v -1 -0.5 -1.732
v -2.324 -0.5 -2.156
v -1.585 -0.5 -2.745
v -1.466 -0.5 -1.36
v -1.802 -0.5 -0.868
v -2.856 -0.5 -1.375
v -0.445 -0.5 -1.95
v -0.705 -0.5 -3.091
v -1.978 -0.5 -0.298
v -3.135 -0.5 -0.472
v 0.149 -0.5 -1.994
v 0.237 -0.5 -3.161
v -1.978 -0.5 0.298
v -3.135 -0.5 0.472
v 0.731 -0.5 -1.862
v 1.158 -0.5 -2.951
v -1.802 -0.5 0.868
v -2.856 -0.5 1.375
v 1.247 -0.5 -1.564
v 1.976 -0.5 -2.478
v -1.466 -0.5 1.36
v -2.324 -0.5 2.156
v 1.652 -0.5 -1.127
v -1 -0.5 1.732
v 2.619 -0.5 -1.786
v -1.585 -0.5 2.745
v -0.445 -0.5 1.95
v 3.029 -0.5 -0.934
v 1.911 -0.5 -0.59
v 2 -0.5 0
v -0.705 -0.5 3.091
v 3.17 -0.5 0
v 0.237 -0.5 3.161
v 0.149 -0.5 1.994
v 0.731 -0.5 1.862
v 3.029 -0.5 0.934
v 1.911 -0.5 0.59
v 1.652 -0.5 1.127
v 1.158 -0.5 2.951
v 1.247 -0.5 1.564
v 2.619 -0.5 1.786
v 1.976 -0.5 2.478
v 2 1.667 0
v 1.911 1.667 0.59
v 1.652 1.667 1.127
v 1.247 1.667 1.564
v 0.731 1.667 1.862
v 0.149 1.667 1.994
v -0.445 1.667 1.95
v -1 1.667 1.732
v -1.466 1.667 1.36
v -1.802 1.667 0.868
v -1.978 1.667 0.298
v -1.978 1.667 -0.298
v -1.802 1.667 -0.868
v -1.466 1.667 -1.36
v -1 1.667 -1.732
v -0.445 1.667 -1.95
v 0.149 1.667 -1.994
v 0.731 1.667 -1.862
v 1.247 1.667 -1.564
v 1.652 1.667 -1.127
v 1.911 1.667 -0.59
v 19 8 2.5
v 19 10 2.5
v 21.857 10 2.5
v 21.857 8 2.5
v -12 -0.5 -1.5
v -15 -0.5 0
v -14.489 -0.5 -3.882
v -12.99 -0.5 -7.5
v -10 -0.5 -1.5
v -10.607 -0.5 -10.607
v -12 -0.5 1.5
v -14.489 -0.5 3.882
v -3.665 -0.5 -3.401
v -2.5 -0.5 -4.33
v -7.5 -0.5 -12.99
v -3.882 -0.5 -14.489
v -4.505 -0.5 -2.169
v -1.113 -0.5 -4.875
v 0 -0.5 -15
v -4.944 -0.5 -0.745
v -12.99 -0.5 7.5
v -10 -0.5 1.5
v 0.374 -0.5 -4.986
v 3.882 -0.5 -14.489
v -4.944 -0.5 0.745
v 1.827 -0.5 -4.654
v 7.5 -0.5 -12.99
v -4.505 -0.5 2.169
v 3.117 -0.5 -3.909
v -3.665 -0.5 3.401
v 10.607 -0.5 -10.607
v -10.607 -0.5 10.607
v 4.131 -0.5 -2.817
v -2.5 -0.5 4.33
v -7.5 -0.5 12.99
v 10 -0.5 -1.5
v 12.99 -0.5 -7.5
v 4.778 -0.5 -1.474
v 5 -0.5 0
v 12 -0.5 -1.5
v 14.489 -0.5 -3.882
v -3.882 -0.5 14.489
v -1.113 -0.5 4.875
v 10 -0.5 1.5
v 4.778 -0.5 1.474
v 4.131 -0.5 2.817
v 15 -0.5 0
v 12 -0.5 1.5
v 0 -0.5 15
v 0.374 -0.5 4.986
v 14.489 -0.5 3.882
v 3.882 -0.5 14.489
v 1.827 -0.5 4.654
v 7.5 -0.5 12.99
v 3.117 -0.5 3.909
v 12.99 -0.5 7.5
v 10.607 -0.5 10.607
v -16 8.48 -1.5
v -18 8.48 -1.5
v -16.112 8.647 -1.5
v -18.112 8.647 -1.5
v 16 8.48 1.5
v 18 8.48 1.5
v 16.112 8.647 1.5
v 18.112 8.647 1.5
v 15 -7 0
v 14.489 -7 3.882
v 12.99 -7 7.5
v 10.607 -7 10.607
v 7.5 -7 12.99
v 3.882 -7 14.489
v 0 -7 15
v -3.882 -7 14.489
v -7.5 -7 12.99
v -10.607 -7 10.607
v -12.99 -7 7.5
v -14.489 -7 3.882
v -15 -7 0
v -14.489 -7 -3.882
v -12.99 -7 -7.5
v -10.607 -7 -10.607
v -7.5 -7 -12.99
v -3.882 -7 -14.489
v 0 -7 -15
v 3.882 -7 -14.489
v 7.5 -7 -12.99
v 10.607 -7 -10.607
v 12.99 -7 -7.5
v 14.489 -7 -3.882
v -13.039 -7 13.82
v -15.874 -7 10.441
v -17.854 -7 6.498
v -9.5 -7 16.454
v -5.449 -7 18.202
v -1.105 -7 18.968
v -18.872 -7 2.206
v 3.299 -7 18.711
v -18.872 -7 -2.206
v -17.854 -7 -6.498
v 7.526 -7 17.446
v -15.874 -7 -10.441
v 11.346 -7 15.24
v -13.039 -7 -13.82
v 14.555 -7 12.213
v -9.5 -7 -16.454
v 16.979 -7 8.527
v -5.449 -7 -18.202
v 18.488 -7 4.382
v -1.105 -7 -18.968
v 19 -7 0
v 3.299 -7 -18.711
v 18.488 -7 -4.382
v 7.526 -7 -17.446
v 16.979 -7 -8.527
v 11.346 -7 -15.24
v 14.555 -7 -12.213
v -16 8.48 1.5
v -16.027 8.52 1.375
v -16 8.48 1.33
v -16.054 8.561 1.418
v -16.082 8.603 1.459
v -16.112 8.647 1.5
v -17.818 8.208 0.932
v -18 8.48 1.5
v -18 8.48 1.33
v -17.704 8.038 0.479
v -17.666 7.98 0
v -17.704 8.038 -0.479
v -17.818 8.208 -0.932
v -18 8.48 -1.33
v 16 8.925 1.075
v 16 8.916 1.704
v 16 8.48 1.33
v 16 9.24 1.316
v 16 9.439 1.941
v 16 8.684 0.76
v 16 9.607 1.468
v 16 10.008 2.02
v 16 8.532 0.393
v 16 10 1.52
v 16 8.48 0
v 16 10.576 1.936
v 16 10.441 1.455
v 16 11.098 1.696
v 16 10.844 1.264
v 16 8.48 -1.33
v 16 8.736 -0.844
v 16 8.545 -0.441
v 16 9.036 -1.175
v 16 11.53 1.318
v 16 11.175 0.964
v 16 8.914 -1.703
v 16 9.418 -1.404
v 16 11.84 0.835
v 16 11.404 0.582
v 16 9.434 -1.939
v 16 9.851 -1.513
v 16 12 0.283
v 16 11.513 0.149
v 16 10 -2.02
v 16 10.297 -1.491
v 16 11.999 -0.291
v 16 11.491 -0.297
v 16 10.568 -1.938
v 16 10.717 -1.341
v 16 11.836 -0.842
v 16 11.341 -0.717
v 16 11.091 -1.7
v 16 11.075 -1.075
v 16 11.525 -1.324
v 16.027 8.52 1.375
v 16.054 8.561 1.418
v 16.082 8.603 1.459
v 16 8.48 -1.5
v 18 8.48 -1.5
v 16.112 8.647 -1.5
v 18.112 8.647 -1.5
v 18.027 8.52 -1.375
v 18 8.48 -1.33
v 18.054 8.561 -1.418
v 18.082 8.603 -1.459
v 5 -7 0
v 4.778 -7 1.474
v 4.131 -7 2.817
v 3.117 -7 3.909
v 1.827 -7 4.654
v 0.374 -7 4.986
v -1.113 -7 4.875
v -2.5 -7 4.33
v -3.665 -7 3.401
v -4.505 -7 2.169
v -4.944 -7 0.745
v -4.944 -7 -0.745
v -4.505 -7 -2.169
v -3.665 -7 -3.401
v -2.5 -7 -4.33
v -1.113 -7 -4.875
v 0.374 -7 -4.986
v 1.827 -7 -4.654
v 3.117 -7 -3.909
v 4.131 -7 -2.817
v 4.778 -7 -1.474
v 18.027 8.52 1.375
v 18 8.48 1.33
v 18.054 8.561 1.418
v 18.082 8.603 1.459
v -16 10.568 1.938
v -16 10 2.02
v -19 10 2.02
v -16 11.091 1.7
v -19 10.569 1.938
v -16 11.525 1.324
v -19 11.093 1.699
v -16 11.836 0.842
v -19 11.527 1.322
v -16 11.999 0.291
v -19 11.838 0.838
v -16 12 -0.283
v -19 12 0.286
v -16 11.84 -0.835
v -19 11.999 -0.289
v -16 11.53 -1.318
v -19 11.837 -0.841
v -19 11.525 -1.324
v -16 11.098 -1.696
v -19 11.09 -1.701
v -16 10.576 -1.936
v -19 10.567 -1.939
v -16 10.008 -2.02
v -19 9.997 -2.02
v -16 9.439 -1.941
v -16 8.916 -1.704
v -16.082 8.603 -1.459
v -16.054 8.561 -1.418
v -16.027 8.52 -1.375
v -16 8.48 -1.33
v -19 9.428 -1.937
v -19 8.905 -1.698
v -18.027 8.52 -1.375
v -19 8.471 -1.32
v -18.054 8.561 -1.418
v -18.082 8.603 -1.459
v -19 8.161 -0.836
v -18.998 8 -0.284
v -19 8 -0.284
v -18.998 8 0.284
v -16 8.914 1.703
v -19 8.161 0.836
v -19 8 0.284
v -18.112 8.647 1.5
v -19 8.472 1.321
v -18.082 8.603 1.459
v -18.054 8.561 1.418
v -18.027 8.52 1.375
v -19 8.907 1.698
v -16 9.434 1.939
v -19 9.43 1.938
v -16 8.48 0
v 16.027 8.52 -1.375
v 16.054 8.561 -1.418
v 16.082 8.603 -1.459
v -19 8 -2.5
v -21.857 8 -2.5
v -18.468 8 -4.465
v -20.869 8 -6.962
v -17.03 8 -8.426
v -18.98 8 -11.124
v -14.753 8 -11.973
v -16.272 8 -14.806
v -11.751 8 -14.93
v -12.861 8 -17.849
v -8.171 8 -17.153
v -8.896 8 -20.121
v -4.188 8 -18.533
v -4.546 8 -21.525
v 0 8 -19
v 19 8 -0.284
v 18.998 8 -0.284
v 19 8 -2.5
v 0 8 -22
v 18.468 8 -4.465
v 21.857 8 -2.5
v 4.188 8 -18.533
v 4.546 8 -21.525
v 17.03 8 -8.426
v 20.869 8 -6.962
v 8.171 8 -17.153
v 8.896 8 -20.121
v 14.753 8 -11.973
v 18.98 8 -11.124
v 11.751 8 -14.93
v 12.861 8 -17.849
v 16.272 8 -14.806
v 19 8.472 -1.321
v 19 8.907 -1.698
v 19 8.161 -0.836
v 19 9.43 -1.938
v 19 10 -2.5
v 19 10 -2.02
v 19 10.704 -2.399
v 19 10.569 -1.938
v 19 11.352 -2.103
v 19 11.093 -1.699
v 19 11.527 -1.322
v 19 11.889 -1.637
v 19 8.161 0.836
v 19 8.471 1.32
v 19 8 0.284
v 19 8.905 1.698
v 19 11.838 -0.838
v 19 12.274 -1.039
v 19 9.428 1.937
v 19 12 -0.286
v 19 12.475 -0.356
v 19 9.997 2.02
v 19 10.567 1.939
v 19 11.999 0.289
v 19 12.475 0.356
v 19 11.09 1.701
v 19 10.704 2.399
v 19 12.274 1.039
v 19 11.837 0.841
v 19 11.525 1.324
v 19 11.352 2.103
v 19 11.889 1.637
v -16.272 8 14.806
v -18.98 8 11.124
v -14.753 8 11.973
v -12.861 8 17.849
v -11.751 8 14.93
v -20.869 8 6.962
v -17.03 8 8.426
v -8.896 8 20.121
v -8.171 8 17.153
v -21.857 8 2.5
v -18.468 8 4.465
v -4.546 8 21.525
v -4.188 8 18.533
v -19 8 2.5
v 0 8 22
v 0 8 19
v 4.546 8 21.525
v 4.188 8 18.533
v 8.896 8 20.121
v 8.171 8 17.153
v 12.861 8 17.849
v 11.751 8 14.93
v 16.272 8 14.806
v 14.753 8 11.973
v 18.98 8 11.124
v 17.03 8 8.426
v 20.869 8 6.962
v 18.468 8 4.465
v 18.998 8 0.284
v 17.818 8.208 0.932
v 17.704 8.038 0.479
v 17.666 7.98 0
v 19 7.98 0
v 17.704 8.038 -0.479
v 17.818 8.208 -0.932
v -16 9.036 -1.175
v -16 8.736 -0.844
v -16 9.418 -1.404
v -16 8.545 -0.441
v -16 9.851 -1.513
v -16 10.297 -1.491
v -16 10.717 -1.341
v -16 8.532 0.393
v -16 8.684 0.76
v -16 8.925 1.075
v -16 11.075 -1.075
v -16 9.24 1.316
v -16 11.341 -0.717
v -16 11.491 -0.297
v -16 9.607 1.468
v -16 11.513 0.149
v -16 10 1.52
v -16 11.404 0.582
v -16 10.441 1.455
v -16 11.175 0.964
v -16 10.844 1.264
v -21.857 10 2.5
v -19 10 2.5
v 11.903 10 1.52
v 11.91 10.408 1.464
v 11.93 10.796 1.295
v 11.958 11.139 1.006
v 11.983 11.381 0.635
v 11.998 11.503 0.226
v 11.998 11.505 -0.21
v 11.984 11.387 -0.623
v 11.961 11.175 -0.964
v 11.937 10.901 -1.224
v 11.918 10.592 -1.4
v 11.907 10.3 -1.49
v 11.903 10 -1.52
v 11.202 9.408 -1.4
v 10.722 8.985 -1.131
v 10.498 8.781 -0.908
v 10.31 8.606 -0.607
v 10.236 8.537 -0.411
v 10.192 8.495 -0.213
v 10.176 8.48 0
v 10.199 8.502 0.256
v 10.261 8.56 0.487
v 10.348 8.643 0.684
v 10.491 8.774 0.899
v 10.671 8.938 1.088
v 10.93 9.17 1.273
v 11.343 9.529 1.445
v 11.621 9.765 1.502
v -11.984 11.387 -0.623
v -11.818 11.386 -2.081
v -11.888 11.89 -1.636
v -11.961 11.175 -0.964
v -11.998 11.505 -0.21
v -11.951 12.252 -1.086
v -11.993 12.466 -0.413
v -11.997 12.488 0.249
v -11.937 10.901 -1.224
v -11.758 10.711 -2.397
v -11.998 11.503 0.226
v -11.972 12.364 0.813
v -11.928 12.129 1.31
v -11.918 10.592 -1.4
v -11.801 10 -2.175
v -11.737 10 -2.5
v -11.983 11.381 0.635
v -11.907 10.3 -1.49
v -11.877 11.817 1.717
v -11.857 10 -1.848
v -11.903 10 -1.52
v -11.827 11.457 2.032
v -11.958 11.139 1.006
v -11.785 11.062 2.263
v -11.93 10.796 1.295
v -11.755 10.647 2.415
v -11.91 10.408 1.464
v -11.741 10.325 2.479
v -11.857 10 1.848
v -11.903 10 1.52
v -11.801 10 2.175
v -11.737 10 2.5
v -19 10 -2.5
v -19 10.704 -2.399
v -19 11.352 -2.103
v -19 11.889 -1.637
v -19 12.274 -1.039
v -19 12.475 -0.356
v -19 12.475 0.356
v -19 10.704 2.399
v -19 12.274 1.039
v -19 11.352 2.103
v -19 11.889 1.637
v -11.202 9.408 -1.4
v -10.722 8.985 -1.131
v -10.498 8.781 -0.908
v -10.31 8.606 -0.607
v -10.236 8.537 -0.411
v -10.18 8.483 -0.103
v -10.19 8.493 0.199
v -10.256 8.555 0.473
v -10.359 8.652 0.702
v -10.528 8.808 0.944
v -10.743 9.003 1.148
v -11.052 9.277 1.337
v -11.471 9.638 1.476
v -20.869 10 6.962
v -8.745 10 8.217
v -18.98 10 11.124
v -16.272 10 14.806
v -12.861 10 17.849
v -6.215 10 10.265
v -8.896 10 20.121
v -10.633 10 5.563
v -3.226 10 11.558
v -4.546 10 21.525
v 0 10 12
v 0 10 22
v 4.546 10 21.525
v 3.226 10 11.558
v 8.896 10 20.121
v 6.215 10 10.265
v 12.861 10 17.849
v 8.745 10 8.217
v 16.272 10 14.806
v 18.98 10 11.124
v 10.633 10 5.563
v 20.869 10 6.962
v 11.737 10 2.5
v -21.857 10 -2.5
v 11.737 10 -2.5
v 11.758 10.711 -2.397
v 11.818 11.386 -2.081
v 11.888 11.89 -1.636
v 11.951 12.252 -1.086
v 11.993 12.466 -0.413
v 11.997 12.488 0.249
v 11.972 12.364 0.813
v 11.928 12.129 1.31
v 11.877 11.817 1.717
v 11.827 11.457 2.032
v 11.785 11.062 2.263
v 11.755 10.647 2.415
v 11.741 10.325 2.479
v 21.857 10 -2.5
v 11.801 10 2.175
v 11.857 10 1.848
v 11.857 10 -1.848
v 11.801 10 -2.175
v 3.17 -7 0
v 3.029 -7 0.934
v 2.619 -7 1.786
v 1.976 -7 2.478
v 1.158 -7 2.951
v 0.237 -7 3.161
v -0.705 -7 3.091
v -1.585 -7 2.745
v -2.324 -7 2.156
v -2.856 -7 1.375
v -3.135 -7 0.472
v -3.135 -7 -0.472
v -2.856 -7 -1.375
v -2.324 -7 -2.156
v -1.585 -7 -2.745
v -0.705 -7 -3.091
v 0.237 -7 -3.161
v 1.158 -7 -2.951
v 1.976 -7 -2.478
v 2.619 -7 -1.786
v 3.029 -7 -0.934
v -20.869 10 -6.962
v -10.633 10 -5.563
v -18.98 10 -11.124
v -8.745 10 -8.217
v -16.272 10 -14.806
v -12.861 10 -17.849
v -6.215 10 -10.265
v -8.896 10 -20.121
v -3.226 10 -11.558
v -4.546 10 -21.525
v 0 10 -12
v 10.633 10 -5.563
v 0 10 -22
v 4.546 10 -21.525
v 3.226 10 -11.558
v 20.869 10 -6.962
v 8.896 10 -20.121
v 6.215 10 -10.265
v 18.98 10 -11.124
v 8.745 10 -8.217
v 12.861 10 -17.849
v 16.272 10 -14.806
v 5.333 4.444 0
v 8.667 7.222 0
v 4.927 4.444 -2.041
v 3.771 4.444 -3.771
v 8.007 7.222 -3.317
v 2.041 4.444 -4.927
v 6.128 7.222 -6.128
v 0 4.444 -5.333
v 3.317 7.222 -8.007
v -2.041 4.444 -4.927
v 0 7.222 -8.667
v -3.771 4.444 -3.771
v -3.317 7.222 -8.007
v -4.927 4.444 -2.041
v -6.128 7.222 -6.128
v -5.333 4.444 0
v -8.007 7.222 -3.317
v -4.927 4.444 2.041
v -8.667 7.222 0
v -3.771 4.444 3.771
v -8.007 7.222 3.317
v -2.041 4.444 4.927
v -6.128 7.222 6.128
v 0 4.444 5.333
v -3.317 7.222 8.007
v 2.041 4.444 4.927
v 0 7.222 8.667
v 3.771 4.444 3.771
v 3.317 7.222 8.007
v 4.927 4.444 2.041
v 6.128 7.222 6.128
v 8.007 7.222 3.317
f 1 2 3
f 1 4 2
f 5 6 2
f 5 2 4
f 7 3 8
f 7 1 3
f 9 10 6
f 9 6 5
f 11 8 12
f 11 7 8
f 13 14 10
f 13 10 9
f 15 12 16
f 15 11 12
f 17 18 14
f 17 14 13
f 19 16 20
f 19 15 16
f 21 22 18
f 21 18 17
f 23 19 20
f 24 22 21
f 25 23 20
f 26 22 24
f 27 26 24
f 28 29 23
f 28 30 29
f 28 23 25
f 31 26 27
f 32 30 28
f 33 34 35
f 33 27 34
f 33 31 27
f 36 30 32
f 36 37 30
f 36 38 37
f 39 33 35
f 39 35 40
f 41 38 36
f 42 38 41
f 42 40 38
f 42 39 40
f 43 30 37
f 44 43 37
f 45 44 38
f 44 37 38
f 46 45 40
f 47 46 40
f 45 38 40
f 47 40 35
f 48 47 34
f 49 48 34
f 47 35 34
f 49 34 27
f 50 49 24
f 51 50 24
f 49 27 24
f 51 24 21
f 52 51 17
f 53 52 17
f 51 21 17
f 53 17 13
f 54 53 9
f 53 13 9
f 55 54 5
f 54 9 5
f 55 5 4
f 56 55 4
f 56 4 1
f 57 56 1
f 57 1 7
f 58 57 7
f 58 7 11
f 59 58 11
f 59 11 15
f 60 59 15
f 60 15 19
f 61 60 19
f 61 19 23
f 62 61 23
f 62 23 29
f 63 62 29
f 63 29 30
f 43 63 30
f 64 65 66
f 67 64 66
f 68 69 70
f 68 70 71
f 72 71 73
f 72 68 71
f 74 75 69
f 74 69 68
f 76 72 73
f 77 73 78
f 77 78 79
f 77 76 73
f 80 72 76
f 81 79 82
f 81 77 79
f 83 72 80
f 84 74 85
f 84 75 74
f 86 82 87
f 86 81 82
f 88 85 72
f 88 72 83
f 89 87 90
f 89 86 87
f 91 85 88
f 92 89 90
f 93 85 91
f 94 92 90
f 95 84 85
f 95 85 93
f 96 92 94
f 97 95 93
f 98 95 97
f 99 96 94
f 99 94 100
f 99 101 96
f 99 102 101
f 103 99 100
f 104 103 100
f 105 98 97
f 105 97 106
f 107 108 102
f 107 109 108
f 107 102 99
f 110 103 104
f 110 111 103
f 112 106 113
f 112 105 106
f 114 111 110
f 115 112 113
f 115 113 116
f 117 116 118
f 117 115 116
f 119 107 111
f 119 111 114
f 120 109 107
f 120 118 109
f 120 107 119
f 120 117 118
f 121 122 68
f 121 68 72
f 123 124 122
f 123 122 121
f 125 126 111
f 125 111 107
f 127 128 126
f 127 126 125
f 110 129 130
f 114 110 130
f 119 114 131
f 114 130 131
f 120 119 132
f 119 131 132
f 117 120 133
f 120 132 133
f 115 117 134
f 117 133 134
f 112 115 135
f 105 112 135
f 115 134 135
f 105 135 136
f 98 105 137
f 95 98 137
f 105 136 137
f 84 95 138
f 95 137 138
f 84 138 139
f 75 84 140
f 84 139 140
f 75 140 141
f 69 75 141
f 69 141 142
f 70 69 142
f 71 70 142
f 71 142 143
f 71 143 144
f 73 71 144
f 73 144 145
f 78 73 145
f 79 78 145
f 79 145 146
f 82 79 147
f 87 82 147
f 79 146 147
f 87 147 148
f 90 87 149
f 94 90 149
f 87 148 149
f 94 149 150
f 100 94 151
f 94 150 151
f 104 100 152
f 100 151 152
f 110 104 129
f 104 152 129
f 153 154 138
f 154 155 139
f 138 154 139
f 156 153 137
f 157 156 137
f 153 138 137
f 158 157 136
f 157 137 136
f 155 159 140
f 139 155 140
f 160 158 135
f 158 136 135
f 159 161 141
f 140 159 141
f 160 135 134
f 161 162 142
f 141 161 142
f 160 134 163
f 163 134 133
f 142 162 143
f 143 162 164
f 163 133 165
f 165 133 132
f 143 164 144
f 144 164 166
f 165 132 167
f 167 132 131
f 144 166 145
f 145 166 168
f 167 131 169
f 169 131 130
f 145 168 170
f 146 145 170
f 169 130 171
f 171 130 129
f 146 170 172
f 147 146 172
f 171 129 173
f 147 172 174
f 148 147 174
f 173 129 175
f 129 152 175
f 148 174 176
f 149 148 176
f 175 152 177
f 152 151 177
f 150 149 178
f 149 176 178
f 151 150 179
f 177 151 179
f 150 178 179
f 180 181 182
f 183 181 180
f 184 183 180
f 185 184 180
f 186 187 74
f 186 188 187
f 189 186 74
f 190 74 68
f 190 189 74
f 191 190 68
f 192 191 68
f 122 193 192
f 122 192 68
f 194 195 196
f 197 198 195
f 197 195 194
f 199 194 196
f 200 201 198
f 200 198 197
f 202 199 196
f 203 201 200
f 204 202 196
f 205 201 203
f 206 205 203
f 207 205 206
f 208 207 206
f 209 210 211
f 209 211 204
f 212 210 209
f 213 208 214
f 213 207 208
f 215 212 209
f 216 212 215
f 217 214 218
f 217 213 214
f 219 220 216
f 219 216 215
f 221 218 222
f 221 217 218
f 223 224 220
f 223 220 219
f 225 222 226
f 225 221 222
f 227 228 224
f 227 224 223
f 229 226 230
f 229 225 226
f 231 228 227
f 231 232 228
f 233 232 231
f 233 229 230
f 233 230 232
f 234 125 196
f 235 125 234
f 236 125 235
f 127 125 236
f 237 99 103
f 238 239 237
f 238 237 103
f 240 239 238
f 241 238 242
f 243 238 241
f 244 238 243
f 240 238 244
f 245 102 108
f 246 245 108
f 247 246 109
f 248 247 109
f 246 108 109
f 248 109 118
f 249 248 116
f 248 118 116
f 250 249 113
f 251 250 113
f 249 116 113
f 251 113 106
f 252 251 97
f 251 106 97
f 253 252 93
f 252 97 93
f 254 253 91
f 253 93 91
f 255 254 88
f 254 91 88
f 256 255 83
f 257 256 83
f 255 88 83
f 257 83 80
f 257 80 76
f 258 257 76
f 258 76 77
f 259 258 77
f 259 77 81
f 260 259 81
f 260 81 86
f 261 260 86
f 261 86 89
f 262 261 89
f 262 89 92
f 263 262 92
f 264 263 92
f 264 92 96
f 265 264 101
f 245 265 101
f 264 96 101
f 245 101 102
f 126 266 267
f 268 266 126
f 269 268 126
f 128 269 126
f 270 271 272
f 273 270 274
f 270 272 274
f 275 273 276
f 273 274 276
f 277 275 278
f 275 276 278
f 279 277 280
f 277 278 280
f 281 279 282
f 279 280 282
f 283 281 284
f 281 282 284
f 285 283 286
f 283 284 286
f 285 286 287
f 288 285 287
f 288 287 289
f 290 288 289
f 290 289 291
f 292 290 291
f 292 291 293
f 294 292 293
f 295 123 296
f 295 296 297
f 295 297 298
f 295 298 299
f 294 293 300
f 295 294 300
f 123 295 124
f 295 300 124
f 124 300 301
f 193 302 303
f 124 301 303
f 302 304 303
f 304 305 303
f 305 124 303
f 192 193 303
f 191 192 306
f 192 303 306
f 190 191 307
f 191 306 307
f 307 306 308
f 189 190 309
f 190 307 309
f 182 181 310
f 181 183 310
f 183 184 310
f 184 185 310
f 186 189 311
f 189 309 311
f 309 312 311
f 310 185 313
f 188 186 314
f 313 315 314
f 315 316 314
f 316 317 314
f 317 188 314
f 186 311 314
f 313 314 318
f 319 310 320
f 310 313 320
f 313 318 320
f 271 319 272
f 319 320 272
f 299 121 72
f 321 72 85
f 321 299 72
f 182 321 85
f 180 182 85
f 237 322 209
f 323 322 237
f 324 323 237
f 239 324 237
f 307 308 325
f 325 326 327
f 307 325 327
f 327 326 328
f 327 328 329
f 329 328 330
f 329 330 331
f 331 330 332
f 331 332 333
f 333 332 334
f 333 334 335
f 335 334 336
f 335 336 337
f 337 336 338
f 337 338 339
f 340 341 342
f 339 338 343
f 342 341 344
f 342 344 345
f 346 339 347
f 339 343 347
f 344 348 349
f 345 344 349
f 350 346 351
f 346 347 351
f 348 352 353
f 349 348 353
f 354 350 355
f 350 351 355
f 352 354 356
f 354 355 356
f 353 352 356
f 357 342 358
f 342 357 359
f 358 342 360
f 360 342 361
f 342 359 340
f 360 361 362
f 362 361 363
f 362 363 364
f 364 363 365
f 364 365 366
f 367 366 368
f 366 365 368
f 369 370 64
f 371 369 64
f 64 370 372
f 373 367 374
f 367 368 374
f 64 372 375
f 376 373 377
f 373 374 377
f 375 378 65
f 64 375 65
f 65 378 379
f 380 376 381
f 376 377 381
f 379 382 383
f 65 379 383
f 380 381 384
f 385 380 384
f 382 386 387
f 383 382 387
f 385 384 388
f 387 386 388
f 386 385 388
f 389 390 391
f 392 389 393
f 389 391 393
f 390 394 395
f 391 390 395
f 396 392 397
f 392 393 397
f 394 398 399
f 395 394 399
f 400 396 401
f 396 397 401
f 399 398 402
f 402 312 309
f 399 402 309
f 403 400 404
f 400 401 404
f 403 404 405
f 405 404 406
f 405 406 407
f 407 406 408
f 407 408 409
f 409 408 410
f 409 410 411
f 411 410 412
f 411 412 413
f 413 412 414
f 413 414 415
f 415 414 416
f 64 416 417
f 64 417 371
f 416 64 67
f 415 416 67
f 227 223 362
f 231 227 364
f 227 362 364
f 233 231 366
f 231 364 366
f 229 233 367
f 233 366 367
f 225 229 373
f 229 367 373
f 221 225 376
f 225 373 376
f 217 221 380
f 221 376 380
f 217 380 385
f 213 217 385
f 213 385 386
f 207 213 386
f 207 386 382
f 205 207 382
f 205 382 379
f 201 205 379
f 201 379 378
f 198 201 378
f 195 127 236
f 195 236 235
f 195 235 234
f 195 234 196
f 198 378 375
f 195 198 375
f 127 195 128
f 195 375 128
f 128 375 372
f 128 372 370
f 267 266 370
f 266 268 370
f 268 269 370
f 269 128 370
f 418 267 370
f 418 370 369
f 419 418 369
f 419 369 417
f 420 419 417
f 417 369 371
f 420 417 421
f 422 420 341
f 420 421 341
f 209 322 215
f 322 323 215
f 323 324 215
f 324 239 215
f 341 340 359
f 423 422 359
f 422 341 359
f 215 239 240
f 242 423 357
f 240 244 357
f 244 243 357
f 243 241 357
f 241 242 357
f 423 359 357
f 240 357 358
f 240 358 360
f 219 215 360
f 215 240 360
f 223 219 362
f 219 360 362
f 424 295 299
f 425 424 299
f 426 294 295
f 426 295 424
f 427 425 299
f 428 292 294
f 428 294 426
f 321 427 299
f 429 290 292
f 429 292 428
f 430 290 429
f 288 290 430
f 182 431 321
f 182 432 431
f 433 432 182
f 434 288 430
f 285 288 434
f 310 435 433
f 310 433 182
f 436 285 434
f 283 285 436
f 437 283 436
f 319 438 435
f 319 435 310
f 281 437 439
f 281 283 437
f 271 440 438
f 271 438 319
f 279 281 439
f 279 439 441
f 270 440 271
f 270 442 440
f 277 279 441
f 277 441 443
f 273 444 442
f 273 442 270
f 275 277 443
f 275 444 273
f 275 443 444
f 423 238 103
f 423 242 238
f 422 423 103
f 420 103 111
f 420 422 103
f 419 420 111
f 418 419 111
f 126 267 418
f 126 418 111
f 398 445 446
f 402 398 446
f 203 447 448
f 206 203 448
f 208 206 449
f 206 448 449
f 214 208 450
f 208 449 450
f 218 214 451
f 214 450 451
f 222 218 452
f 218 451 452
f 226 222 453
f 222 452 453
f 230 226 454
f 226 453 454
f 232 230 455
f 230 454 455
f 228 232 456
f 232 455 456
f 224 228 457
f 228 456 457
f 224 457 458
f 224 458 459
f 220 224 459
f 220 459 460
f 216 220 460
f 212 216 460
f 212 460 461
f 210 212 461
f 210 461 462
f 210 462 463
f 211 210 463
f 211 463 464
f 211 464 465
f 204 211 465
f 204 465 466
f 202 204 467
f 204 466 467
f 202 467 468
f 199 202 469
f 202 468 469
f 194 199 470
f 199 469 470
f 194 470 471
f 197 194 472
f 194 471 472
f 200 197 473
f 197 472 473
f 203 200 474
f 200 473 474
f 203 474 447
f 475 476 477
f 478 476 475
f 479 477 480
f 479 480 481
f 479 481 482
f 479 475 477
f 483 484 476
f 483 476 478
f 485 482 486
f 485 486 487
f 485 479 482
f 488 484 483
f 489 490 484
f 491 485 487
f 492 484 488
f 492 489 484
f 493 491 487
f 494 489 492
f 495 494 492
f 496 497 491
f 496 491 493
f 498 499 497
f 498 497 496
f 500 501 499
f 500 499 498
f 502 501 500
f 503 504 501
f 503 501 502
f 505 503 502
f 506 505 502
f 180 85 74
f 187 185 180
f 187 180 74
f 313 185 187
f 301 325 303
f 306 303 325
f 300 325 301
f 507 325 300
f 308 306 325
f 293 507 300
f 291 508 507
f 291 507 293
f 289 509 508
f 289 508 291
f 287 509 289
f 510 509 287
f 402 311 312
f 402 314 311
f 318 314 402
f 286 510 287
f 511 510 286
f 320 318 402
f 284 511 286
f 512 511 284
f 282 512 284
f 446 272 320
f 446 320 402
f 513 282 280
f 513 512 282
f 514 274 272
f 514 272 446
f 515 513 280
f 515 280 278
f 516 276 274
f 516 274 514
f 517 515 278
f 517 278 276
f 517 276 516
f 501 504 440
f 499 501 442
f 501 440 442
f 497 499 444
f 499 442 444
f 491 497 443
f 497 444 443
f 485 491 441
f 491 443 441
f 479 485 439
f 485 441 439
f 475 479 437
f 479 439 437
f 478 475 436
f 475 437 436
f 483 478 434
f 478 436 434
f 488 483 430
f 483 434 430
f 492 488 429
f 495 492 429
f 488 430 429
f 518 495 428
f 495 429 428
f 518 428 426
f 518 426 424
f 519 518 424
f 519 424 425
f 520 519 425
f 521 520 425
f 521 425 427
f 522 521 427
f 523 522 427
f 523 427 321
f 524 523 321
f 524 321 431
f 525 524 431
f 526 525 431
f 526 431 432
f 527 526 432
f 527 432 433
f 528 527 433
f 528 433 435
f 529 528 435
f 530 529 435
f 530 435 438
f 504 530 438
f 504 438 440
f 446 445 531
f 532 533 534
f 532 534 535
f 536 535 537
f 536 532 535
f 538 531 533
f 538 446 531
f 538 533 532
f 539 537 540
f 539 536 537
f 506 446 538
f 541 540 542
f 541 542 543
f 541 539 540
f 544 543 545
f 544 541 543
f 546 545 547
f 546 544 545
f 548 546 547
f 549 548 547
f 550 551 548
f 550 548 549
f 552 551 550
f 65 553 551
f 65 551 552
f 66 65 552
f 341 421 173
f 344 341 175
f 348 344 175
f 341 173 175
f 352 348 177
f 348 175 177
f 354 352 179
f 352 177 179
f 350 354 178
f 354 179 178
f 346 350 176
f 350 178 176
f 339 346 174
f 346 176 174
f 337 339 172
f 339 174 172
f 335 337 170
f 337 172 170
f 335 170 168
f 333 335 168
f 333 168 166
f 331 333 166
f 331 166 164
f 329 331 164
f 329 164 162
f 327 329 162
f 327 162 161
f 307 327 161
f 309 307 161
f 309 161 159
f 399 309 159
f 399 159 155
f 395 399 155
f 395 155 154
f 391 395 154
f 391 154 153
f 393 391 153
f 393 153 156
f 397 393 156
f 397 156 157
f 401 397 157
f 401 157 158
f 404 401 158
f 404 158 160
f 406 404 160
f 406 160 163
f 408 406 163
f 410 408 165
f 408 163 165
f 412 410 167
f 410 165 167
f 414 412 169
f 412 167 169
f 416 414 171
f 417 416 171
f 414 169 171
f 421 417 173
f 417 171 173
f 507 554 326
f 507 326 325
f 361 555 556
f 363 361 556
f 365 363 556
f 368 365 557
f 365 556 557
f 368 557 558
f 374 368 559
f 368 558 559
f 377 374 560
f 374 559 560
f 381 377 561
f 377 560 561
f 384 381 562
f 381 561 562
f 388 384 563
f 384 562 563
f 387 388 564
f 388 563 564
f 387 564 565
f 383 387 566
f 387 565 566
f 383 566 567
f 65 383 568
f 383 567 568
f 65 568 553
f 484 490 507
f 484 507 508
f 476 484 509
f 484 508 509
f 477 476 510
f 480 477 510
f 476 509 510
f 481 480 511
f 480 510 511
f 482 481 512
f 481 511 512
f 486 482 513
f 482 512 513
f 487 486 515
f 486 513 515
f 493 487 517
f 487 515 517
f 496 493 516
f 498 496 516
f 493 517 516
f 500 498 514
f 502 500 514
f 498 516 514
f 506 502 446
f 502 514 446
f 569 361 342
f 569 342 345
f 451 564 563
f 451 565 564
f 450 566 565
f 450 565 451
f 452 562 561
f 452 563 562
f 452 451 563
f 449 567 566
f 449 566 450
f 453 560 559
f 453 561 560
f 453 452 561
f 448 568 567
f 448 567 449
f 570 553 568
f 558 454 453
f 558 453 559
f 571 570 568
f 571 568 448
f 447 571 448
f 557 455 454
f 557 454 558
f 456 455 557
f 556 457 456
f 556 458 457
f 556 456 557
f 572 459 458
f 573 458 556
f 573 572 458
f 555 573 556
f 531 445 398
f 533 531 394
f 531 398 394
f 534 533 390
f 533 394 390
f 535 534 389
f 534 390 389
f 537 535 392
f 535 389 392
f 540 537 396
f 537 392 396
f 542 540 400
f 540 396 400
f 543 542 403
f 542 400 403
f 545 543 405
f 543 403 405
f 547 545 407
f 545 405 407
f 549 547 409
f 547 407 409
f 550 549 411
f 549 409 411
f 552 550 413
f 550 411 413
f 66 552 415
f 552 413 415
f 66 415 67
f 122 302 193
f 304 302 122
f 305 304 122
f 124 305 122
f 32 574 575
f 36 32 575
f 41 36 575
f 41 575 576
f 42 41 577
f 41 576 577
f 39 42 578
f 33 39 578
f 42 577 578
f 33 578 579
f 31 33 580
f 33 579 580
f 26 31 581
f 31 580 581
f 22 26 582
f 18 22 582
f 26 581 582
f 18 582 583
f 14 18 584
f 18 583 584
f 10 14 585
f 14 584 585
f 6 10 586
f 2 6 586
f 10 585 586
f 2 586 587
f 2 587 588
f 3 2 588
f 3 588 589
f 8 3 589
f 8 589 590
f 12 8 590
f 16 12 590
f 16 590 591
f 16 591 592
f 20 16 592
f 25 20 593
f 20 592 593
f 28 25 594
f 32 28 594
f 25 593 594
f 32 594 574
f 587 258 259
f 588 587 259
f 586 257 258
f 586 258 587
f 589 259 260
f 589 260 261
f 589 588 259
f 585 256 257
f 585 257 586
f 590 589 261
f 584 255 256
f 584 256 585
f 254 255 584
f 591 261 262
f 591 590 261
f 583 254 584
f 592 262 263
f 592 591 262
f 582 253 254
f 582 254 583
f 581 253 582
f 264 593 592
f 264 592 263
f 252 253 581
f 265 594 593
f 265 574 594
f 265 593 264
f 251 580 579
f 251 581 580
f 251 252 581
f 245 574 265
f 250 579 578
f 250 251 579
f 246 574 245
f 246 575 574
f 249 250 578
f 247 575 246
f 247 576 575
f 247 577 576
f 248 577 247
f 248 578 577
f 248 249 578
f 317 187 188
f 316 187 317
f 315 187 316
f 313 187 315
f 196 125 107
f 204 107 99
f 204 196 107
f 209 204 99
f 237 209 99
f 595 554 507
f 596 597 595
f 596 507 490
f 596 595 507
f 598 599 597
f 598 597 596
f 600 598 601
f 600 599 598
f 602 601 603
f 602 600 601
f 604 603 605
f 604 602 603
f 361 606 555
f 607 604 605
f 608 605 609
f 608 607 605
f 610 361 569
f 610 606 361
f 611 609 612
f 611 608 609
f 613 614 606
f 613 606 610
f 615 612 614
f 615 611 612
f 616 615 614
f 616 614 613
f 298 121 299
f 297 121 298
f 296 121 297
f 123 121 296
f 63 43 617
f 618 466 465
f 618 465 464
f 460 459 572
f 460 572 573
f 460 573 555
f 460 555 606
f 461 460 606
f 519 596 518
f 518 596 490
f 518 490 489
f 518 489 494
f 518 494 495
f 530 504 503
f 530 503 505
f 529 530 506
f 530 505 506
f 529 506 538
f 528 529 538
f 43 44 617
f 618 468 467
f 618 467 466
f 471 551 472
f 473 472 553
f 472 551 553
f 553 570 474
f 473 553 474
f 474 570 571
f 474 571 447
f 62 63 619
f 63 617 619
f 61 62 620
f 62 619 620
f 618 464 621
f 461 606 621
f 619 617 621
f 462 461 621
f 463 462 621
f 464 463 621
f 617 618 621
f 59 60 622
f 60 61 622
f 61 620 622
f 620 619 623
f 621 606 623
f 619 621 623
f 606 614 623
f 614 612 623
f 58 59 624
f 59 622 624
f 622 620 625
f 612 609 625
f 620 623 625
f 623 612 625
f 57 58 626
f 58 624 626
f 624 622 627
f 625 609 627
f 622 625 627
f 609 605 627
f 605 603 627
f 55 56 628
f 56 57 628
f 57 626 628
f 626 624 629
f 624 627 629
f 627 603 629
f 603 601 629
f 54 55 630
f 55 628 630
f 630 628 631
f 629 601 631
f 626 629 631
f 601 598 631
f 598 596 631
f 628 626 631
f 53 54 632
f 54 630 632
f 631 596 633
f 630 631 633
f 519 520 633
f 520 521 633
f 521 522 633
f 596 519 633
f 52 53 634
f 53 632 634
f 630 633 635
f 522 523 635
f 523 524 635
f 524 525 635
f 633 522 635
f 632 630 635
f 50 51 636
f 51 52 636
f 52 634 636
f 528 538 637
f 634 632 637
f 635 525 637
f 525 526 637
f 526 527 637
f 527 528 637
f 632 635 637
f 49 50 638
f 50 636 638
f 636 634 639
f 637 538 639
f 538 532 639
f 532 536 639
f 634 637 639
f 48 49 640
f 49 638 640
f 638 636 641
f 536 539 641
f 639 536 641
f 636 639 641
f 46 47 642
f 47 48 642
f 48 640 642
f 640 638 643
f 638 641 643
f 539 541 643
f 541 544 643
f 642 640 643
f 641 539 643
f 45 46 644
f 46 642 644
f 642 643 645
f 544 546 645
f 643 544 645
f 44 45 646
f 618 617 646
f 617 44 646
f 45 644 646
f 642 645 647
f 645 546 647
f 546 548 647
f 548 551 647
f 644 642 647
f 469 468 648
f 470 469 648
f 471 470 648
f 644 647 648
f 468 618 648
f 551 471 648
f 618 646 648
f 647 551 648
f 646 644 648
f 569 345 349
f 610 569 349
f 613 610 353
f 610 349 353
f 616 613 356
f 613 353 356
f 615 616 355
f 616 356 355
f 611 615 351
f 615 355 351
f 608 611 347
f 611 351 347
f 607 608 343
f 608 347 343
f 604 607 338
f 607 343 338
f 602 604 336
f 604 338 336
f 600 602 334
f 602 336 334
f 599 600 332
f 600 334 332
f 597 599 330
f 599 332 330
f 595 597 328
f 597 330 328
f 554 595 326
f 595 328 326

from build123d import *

# Parameters (mm, degrees)
SKETCH2_W               = 7
SKETCH2_H               = 2.5
REVOLVE2_ANGLE          = 180
BOSS_EXTRUDE4_DEPTH     = 24
CUT_EXTRUDE1_DEPTH      = 3.5
SKETCH17_W              = 3
SKETCH17_H              = 5
CUT_EXTRUDE6_DEPTH      = 18
SKETCH16_R              = 1.52
CUT_EXTRUDE5_DEPTH      = 3.857492994
CUT_EXTRUDE5_DEPTH_BACK = 41.857492994
SKETCH19_R              = 2.02
CUT_EXTRUDE7_DEPTH      = 3
SKETCH20_R              = 2.02
CUT_EXTRUDE8_DEPTH      = 3
SKETCH21_R              = 15
CUT_EXTRUDE9_DEPTH      = 6.5
SKETCH22_R              = 5
BOSS_EXTRUDE6_DEPTH     = 6.5
SKETCH23_W              = 2
SKETCH23_H              = 3
SKETCH24_W              = 2
SKETCH24_H              = 3
SKETCH25_R              = 2
CUT_EXTRUDE11_DEPTH     = 20.5000001
SKETCH26_R              = 3.17
CUT_EXTRUDE12_DEPTH     = 6.5


with BuildPart() as part:
    # Sketch1 → Revolve1 (revolve)
    with BuildSketch(Plane.XY):
        Polygon((0, 0), (12, 10), (17, 10), (22, 10), (22, 8), (19, 8), (19, -7), (0, -7), align=None)
    revolve(axis=Axis((0, -7, 0), (0, 1, 0)))

    # Sketch2 → Revolve2 (revolve)
    with BuildSketch(Plane(origin=(0, 10, 0), x_dir=(1, 0, 0), z_dir=(0, 1, 0))):
        with Locations((15.5, 1.25)):
            Rectangle(SKETCH2_W, SKETCH2_H)
        with Locations((-15.5, 1.25)):
            Rectangle(SKETCH2_W, SKETCH2_H)
    revolve(axis=Axis((0, 10, 0), (1, 0, 0)), revolution_arc=REVOLVE2_ANGLE)

    # Sketch8 → Boss-Extrude4 (add)
    with BuildSketch(Plane(origin=(-12, 0, 0), x_dir=(0, 0, -1), z_dir=(1, 0, 0))):
        with BuildLine():
            Line((-2.5, 10), (0, 10))
            Line((0, 10), (2.5, 10))
            ThreePointArc((2.5, 10), (0, 12.5), (-2.5, 10))
        make_face()
    extrude(amount=BOSS_EXTRUDE4_DEPTH)

    # Sketch9 → Cut-Extrude1 (cut, through all)
    with BuildSketch(Plane(origin=(0, 10, 0), x_dir=(1, 0, 0), z_dir=(0, 1, 0))):
        with BuildLine():
            ThreePointArc((-11.736694594, 2.5), (-12, 0), (-11.736694594, -2.5))
            ThreePointArc((-11.736694594, -2.5), (0, -12), (11.736694594, -2.5))
            ThreePointArc((11.736694594, -2.5), (12, 0), (11.736694594, 2.5))
            ThreePointArc((11.736694594, 2.5), (0, 12), (-11.736694594, 2.5))
        make_face()
    extrude(amount=CUT_EXTRUDE1_DEPTH, mode=Mode.SUBTRACT)

    # Sketch17 → Cut-Extrude6 (cut, through all)
    with BuildSketch(Plane(origin=(0, 10, 0), x_dir=(1, 0, 0), z_dir=(0, 1, 0))):
        with Locations((20.5, 0)):
            Rectangle(SKETCH17_W, SKETCH17_H)
        with Locations((-20.5, 0)):
            Rectangle(SKETCH17_W, SKETCH17_H)
    extrude(amount=-CUT_EXTRUDE6_DEPTH, mode=Mode.SUBTRACT)

    # Sketch16 → Cut-Extrude5 (cut, two sides)
    with BuildSketch(Plane.ZY.offset(19)) as cut_extrude5_sk:
        with Locations((0, 10)):
            Circle(SKETCH16_R)
    extrude(amount=CUT_EXTRUDE5_DEPTH, mode=Mode.SUBTRACT)
    extrude(cut_extrude5_sk.sketch, amount=-CUT_EXTRUDE5_DEPTH_BACK, mode=Mode.SUBTRACT)

    # Sketch19 → Cut-Extrude7 (cut)
    with BuildSketch(Plane.ZY.offset(19)):
        with Locations((0, 10)):
            Circle(SKETCH19_R)
    extrude(amount=-CUT_EXTRUDE7_DEPTH, mode=Mode.SUBTRACT)

    # Sketch20 → Cut-Extrude8 (cut)
    with BuildSketch(Plane(origin=(19, 0, 0), x_dir=(0, 0, -1), z_dir=(1, 0, 0))):
        with Locations((0, 10)):
            Circle(SKETCH20_R)
    extrude(amount=-CUT_EXTRUDE8_DEPTH, mode=Mode.SUBTRACT)

    # Sketch21 → Cut-Extrude9 (cut)
    with BuildSketch(Plane.XZ.offset(7)):
        Circle(SKETCH21_R)
    extrude(amount=-CUT_EXTRUDE9_DEPTH, mode=Mode.SUBTRACT)

    # Sketch22 → Boss-Extrude6 (add)
    with BuildSketch(Plane.XZ.offset(0.5)):
        Circle(SKETCH22_R)
    extrude(amount=BOSS_EXTRUDE6_DEPTH)

    # Cut-Sweep2: sweep along a curve in space
    with BuildLine() as cut_sweep2_path:
        Line((10, -0.5, 0), (16, 8.48, 0))
        Line((16, 8.48, 0), (16.813206723, 9.697099395, 0))
    # Sketch23 → Cut-Sweep2 (sweep, cut)
    with BuildSketch(Plane.XZ.offset(0.5)):
        with Locations((11, 0)):
            Rectangle(SKETCH23_W, SKETCH23_H)
    sweep(path=cut_sweep2_path.line, mode=Mode.SUBTRACT)

    # Cut-Sweep3: sweep along a curve in space
    with BuildLine() as cut_sweep3_path:
        Line((-10, -0.5, 0), (-16, 8.48, 0))
        Line((-16, 8.48, 0), (-16.813206723, 9.697099395, 0))
    # Sketch24 → Cut-Sweep3 (sweep, cut)
    with BuildSketch(Plane.XZ.offset(0.5)):
        with Locations((-11, 0)):
            Rectangle(SKETCH24_W, SKETCH24_H)
    sweep(path=cut_sweep3_path.line, mode=Mode.SUBTRACT)

    # Sketch25 → Cut-Extrude11 (cut, through all)
    with BuildSketch(Plane.XZ.offset(7)):
        Circle(SKETCH25_R)
    extrude(amount=-CUT_EXTRUDE11_DEPTH, mode=Mode.SUBTRACT)

    # Sketch26 → Cut-Extrude12 (cut)
    with BuildSketch(Plane.XZ.offset(7)):
        Circle(SKETCH26_R)
    extrude(amount=-CUT_EXTRUDE12_DEPTH, mode=Mode.SUBTRACT)


solid = part.part
